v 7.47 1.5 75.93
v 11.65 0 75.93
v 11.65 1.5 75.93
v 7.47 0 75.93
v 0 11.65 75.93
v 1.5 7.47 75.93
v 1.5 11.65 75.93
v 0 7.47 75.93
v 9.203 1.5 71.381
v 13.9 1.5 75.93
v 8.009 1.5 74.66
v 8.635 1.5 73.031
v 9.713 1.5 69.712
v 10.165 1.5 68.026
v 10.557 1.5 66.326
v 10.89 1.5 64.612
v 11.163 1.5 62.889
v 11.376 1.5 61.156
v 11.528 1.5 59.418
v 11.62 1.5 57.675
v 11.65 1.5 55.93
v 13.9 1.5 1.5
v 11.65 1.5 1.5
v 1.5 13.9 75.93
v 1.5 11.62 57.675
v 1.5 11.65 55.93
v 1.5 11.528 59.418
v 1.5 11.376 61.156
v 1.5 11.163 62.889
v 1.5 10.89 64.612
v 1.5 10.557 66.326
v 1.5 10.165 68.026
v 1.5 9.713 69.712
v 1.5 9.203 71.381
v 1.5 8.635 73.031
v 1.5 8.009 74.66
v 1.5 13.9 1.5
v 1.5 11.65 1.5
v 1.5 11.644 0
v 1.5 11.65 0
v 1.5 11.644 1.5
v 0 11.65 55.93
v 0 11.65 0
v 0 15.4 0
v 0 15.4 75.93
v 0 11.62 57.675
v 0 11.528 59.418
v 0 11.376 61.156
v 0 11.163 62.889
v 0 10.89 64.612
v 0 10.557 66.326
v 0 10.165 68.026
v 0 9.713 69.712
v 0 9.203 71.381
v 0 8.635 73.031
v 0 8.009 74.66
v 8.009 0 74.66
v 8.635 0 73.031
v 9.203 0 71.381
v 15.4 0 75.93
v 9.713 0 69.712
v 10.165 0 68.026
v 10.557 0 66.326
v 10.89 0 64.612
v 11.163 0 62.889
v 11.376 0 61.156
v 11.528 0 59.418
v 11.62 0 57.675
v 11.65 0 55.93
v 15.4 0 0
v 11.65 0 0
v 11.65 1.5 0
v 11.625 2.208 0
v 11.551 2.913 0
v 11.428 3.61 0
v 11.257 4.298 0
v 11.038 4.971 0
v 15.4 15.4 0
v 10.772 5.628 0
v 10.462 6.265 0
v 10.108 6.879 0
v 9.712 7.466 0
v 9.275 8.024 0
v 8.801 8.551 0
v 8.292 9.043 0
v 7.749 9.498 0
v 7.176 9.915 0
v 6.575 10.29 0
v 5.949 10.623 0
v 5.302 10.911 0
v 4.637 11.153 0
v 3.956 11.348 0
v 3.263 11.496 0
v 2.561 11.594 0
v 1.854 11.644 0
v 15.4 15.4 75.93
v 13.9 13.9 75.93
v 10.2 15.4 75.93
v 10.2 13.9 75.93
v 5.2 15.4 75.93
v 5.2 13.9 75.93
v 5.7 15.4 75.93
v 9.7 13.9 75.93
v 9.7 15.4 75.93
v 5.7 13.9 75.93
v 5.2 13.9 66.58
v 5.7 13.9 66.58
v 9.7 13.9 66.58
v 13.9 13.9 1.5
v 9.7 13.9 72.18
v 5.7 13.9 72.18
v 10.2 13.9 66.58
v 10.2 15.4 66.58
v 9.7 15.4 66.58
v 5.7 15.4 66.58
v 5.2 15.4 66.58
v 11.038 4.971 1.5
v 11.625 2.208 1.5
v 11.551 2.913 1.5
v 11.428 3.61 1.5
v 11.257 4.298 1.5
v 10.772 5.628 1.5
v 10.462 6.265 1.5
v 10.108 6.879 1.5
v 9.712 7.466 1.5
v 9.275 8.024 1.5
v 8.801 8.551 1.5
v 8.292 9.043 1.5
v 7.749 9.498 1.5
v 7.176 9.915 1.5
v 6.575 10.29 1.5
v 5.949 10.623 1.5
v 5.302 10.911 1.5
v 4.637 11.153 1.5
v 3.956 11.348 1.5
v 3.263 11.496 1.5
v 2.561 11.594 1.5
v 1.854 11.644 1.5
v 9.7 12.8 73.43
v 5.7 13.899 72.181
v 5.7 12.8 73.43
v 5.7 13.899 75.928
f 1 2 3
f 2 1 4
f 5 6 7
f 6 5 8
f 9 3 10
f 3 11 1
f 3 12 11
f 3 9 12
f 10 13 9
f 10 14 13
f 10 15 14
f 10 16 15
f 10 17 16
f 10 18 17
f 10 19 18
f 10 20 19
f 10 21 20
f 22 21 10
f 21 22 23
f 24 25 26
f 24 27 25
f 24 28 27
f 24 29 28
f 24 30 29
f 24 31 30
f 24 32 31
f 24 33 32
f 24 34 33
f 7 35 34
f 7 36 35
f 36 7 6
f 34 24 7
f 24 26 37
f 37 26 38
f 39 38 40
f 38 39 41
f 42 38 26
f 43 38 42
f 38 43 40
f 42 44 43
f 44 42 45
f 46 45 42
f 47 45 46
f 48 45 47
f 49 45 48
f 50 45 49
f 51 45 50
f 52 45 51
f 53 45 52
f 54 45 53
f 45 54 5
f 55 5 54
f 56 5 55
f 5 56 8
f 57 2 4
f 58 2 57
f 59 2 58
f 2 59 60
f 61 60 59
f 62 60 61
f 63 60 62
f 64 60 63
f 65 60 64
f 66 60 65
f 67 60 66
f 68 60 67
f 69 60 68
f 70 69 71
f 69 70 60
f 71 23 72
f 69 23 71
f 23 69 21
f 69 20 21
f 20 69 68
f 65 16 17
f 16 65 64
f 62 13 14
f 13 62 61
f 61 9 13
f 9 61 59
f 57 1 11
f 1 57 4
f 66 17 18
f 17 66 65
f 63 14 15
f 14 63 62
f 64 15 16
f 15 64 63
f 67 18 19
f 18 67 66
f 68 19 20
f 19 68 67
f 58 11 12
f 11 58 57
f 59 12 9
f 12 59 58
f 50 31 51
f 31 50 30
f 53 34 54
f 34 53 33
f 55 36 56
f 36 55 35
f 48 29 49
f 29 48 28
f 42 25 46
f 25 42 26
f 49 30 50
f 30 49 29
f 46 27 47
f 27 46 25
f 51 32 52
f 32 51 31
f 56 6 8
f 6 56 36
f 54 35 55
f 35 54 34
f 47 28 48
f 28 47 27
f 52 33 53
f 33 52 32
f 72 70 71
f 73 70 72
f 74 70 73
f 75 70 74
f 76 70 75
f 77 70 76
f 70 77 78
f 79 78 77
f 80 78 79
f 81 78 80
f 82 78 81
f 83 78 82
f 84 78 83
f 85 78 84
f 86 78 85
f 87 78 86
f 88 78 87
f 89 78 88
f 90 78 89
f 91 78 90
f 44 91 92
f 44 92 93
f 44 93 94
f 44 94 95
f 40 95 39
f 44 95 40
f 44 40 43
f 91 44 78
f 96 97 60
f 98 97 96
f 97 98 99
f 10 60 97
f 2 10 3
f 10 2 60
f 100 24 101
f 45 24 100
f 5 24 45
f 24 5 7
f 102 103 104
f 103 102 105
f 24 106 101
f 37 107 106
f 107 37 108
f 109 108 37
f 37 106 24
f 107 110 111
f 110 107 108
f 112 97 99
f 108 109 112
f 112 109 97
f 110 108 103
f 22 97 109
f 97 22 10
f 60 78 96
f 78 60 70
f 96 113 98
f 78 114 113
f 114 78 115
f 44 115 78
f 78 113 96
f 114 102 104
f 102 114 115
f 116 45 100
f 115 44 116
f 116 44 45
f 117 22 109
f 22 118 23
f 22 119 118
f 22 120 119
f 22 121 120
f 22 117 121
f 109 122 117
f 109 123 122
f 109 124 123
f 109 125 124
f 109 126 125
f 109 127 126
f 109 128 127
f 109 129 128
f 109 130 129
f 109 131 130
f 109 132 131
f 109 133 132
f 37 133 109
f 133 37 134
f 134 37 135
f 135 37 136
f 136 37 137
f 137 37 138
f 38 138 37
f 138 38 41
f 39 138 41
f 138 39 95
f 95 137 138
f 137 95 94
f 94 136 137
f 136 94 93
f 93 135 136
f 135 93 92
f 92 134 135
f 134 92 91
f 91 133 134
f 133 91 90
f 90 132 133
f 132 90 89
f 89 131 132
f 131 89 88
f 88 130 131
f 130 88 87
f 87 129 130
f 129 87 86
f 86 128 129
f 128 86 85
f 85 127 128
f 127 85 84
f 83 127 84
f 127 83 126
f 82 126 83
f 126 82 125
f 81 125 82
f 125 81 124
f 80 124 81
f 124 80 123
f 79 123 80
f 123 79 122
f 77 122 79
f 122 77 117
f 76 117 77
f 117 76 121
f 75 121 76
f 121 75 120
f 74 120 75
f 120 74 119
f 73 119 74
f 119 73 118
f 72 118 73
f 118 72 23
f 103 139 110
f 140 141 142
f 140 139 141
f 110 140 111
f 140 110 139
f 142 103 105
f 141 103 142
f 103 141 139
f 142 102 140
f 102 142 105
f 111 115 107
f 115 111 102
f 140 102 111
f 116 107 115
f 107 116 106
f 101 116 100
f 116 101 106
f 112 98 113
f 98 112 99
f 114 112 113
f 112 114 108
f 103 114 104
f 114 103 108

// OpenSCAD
/*
A small part which securely stores and conveniently dispenses 6-sided dice.

Default configuration holds 6 Chessex 12mm dice, but the design is parameterized to
easily allow for other amounts of dice, or to use different dice sizes or tolerances with
a little more effort.
*/

// Number of dice to generate for
num_dice = 6;

// Dimensions of the dice, with tolerance
die_width = 12.40;
die_height = 11.93;

// Thickness of all body walls
wall_thick = 1.5;

// Width of the walls that hold the dice in
retainer_width = 2.25;

// Size of the detent "bump" holding the dice in
detent_height = 3.75;
detent_middle = 1.25;
detent_depth = 1.1;
detent_width = 4;

// Size of the slots either side of the detent
cutout_width = 0.5;
cutout_height = 8;

// Space above the top of the last die; used to align the detent
ramp_height = 2.85;

// Total height and radius to use for "lips" that constrict toward the opening
lip_radius = 50;
lip_height = 20;

// Tolerance value to avoid floating point errors in render
epsil = 0.001;


module body() {
    linear_extrude(wall_thick + num_dice * die_height + ramp_height) {
        difference() {
            square(die_width + 2*wall_thick);
            translate([wall_thick, wall_thick]) {
                square(die_width);
            }
            square(die_width + wall_thick - retainer_width);
        }
    }
}

module cap() {
    linear_extrude(wall_thick) {
        translate([wall_thick, wall_thick]) {
            difference() {
                square(die_width);
                circle(die_width - retainer_width, $fn=90);
            }
        }
    }
}

module detent() {
    rotate(-90, [0,0,1]) {
        rotate(90, [1,0,0]) {
            linear_extrude(detent_width) {
                polygon([
                    [0,0],
                    [detent_depth,detent_middle],
                    [0,detent_height]
                ]);
            }
        }
    }
}

module lips_cyl() {
    translate([0, -epsil, 0]) {
        rotate(-90, [1,0,0]) {
            linear_extrude(wall_thick + 2*epsil) {
                translate([-lip_radius + die_width + wall_thick - retainer_width, 0, 0]) {
                    circle(lip_radius, $fn=180);
                }
            }
        }
    }
}

module lips() {
    difference() {
        linear_extrude(lip_height) {
            difference() {
                square(wall_thick + die_width - retainer_width);
                translate([wall_thick, wall_thick]) {
                    square(die_width);
                }
            }
        }
        lips_cyl();
        mirror([1,-1,0]) {
            lips_cyl();
        }
    }
}

module cutouts() {
    cube([cutout_width, wall_thick + 2*epsil, cutout_height + ramp_height]);
    translate([cutout_width + detent_width, 0, 0]) {
        cube([cutout_width, wall_thick + 2*epsil, cutout_height + ramp_height]);
    }
}

// Align and put together all the bits
difference() {
    union() {
        body();
        cap();
        translate([
            (wall_thick*2 + die_width + detent_width)/2,
            wall_thick + die_width,
            wall_thick + num_dice*die_height + ramp_height - detent_height
        ]) {
            detent();
        }
        translate([0, 0, wall_thick + num_dice*die_height + ramp_height - lip_height]) {
            lips();
        }
    }
    translate([
        wall_thick + (die_width - detent_width)/2 - cutout_width,
        wall_thick + die_width - epsil,
        wall_thick*2 + die_height*num_dice - cutout_height
    ]) {
        cutouts();
    }
}
